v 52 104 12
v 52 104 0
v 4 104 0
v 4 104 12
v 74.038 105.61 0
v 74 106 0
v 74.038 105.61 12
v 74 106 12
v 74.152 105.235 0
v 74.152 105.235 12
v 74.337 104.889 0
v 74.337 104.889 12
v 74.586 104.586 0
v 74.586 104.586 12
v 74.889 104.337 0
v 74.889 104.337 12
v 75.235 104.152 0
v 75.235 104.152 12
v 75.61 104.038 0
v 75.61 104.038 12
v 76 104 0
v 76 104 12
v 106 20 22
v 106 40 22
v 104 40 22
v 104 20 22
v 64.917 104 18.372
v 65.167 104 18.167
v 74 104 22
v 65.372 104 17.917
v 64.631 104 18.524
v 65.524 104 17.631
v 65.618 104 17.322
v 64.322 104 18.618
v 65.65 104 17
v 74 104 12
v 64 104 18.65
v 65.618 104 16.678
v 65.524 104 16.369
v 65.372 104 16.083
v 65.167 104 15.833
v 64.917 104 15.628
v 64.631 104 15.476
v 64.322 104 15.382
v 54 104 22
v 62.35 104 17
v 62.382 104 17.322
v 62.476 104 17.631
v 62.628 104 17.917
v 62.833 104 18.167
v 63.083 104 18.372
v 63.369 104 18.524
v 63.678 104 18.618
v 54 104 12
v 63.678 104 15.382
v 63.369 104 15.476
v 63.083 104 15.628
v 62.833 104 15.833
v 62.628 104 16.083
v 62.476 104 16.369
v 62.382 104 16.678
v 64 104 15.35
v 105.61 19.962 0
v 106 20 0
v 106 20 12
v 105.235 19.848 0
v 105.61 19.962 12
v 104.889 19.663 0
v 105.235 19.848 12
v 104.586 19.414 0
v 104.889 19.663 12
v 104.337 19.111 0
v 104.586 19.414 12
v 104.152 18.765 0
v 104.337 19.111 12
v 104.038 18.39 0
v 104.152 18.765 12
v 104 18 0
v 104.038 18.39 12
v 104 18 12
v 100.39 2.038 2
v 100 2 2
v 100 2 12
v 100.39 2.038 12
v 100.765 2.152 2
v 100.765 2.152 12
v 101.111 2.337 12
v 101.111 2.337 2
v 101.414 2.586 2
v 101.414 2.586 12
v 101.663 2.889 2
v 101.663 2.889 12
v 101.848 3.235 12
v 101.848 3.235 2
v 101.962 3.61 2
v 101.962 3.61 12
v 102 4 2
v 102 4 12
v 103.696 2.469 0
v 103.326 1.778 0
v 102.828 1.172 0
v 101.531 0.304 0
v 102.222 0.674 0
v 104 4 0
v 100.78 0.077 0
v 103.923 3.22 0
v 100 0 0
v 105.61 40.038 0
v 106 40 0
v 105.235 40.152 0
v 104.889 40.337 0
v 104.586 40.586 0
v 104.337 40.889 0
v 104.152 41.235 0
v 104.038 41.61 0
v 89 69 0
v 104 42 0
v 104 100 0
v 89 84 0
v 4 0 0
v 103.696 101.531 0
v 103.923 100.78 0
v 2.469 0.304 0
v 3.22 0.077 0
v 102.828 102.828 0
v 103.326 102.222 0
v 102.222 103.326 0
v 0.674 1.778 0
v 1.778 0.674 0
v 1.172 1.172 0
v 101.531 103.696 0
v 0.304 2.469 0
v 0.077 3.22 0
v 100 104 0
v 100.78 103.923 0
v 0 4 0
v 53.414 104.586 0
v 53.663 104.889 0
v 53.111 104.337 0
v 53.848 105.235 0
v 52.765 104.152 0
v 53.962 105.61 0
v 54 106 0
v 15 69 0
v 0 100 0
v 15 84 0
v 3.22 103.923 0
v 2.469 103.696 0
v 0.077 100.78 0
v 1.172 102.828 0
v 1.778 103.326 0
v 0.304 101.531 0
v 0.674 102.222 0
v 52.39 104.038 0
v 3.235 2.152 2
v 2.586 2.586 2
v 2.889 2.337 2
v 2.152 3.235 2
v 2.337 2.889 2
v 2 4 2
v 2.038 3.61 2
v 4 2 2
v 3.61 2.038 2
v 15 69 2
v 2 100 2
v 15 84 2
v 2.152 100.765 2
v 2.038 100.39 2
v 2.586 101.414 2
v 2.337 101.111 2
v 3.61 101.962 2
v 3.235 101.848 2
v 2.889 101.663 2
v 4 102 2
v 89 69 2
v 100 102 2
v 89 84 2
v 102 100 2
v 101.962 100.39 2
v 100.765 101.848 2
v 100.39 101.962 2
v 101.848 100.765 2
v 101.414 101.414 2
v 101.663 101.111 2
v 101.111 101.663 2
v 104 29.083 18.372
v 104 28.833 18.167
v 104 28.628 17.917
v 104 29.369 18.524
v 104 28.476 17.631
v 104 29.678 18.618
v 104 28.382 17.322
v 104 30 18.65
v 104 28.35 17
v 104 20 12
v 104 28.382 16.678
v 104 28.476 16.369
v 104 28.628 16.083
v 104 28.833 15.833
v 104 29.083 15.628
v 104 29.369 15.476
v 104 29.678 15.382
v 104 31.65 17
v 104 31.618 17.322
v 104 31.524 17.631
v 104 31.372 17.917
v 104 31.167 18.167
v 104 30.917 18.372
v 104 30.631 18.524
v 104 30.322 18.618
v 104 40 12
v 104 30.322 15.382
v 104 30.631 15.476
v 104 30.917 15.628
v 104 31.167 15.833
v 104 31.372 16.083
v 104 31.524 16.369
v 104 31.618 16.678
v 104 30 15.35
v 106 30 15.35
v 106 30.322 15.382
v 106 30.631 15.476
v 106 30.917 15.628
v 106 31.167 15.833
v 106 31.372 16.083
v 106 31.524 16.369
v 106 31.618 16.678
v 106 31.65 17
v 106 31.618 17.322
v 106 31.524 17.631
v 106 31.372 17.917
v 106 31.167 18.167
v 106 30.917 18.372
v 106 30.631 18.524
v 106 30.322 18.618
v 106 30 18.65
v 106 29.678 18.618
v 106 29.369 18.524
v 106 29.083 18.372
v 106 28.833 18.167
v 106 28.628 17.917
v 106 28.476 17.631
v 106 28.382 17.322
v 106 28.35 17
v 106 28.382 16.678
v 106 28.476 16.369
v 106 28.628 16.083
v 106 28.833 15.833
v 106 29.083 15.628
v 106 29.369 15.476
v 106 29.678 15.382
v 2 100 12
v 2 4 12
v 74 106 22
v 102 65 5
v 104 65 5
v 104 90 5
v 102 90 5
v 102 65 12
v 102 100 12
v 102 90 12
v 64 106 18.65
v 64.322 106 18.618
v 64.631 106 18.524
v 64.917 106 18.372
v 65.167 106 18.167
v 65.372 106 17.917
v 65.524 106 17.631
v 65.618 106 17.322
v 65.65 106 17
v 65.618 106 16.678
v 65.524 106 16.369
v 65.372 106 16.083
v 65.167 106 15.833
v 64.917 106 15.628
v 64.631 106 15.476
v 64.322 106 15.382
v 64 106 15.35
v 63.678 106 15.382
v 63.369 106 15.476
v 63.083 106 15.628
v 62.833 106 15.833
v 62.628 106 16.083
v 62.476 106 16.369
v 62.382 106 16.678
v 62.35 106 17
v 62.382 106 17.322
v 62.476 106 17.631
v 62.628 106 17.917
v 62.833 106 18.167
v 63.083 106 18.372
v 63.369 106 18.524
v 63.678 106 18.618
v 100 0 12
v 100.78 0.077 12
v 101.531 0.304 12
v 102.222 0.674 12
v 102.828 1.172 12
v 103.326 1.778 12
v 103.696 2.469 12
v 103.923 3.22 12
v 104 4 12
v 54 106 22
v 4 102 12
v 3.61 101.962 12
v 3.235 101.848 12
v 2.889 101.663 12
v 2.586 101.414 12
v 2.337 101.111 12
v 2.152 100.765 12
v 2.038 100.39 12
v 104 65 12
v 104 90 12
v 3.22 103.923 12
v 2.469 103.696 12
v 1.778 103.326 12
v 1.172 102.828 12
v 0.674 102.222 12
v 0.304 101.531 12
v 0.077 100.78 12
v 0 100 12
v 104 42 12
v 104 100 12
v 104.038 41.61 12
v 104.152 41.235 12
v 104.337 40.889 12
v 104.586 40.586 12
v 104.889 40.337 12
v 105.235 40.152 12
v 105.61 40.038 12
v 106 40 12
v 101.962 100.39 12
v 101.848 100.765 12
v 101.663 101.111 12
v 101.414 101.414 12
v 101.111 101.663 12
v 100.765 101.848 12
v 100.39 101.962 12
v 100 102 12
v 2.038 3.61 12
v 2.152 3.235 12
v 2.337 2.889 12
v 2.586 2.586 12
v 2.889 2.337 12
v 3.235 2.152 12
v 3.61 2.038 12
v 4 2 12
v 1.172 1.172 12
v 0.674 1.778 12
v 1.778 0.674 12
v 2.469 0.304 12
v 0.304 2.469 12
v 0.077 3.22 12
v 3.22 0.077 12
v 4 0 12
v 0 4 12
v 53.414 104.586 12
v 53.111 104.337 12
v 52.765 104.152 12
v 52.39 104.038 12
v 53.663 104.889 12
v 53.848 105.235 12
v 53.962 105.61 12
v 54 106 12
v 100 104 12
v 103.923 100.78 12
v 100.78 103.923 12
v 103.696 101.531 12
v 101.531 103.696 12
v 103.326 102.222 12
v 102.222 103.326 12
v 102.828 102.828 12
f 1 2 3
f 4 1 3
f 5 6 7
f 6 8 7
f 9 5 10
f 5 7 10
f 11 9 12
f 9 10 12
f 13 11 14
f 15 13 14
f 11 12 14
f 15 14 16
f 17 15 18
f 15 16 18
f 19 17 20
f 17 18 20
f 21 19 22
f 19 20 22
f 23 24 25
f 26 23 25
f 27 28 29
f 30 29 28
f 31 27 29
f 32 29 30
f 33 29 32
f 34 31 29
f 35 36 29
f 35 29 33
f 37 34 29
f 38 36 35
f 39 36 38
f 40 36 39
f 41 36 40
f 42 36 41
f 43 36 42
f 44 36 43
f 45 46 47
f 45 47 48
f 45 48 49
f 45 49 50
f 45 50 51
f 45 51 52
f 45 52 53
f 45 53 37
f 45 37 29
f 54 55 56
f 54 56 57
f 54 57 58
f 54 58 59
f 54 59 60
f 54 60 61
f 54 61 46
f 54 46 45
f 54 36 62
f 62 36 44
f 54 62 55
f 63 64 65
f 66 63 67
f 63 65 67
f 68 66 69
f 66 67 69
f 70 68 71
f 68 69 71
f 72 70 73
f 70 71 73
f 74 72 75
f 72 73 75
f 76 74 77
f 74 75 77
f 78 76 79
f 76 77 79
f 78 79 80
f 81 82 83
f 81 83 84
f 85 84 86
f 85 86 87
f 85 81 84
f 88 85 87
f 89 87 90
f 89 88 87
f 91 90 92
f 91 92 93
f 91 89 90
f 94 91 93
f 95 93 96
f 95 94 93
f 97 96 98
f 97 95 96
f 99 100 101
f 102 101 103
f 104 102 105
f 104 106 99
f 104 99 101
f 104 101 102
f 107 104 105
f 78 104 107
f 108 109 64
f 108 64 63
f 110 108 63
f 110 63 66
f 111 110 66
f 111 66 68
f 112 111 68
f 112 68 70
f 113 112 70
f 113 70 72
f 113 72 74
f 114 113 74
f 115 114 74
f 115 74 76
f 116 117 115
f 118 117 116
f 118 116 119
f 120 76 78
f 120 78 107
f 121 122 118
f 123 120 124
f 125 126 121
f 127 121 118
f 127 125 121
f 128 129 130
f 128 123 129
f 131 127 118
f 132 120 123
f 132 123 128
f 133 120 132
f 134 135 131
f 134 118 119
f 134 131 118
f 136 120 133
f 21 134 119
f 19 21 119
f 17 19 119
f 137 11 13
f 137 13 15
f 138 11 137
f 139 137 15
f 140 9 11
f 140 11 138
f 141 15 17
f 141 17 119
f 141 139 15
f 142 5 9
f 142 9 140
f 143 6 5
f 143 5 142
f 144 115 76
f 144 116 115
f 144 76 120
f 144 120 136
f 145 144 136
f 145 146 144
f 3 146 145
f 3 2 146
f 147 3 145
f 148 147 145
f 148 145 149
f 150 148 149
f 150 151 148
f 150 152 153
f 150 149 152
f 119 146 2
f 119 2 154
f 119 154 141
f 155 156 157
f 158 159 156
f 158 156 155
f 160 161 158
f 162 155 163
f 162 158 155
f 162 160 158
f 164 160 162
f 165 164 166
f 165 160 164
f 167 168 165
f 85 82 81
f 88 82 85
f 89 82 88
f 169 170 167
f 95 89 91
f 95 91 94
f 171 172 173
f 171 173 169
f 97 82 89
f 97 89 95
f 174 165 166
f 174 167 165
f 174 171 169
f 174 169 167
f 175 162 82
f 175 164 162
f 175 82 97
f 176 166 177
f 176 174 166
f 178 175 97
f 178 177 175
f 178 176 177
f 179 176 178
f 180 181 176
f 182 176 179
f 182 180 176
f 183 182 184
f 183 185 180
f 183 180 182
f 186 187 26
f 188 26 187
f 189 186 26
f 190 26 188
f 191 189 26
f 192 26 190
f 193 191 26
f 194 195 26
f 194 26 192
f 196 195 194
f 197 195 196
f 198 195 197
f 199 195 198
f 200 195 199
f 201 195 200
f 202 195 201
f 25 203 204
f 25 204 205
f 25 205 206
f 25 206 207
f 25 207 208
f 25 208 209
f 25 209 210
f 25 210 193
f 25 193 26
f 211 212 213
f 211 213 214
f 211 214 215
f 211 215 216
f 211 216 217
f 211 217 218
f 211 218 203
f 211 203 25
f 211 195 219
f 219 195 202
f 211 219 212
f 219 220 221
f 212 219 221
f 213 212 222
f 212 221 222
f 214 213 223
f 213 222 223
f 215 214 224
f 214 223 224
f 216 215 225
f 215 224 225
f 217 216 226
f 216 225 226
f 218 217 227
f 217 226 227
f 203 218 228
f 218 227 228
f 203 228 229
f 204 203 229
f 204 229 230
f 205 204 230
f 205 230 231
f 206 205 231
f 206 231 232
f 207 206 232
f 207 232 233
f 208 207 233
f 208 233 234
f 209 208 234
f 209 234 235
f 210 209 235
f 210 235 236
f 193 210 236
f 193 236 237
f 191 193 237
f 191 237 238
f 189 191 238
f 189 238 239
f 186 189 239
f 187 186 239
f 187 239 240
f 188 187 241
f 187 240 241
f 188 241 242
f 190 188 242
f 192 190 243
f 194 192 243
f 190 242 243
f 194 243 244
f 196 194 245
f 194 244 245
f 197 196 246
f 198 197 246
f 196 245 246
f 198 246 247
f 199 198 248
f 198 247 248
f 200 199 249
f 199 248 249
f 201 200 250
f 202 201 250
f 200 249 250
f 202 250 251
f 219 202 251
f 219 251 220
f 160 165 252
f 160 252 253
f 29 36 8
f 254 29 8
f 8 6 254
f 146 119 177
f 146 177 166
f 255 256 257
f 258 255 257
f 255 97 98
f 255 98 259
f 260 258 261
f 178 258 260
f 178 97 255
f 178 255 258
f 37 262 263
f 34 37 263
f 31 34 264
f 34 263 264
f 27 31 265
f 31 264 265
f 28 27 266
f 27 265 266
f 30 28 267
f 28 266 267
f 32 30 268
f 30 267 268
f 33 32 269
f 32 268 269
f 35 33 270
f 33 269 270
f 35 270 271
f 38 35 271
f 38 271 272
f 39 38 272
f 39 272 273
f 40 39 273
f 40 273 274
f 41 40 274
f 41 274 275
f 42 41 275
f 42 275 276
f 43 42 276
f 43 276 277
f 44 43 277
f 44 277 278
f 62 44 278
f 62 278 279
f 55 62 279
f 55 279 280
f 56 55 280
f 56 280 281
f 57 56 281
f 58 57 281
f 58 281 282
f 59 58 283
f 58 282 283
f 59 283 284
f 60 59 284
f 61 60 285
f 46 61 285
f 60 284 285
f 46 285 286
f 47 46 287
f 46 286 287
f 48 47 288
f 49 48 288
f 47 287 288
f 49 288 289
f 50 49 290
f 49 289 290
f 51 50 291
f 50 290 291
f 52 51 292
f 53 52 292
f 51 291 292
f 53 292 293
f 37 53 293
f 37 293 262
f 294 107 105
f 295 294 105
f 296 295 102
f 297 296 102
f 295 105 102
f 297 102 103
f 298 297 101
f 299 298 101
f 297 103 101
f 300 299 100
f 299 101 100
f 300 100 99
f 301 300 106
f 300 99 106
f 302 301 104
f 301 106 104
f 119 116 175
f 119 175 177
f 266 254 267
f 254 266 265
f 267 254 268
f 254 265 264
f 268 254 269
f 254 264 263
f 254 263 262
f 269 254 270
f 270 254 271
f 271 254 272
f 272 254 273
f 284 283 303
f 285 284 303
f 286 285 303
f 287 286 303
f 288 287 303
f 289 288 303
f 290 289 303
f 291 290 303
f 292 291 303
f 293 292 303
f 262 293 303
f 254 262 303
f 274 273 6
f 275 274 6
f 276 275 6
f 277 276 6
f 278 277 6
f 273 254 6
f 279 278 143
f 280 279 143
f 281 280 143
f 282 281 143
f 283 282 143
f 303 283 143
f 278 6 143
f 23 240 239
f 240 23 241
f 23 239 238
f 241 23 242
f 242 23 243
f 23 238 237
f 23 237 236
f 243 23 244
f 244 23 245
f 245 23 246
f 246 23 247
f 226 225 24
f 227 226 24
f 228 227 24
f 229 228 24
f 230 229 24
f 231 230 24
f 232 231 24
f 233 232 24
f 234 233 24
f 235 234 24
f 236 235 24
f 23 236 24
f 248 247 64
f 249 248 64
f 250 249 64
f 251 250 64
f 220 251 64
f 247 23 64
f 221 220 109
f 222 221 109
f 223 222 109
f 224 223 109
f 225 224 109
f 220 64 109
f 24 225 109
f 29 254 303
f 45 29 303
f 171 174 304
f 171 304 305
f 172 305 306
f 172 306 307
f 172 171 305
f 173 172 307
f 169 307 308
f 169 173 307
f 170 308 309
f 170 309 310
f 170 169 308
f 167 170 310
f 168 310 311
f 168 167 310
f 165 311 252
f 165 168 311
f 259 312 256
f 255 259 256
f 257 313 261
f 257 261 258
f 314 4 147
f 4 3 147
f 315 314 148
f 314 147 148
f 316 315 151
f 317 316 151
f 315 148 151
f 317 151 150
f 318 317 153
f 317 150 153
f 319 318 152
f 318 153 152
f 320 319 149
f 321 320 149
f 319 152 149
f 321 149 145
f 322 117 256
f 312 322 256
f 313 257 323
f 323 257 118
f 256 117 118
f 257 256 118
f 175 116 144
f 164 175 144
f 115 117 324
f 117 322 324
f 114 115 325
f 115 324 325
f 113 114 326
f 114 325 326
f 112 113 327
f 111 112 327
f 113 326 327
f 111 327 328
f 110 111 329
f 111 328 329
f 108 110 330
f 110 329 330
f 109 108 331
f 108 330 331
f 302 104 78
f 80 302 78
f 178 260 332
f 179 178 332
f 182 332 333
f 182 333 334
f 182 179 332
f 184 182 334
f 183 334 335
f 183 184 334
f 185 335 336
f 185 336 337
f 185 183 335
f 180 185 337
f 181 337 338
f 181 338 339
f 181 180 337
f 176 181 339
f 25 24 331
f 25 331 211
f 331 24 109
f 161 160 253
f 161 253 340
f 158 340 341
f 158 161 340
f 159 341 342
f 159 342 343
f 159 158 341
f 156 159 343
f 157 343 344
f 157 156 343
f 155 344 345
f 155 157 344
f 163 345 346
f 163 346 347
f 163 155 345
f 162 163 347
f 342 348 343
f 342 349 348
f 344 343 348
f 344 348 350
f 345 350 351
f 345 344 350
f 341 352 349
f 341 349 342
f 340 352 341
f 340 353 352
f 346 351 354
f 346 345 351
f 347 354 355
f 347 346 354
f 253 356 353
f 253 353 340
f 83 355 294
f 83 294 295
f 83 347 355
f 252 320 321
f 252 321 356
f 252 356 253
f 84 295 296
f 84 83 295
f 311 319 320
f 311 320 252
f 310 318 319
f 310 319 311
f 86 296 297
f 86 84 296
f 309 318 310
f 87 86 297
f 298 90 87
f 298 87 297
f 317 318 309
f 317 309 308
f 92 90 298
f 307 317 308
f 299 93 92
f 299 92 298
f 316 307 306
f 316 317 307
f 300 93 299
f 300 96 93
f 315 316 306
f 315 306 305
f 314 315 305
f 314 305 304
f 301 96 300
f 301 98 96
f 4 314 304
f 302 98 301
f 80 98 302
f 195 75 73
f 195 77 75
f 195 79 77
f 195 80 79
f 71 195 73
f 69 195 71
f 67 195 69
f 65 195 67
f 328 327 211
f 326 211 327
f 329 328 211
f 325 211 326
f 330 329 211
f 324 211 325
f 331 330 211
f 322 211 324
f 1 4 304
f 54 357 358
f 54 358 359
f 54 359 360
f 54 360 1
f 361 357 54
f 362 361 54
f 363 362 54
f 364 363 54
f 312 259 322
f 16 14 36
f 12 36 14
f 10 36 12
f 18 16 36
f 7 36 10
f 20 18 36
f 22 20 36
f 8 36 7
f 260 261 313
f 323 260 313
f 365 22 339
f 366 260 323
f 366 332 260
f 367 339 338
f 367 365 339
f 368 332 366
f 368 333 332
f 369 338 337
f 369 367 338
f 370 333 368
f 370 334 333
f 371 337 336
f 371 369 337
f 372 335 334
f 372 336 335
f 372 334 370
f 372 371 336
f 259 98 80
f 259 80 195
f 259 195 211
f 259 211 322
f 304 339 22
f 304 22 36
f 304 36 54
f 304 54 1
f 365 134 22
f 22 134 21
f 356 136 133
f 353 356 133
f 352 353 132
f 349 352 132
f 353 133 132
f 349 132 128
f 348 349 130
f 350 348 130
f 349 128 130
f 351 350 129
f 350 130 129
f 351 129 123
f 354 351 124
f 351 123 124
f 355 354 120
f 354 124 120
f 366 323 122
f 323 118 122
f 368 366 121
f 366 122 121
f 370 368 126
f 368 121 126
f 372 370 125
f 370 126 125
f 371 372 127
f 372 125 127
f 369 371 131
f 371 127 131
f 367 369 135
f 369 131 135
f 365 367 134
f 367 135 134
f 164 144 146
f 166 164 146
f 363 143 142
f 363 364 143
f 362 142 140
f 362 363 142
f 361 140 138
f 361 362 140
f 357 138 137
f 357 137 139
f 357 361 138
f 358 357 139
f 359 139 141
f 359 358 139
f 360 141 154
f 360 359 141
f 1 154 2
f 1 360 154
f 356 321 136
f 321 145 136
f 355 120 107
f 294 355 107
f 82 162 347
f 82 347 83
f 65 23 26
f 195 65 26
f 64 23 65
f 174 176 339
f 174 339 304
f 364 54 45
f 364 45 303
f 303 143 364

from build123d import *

# Parameters (mm, degrees)
EXTRUDE_2_DEPTH     = 2
EXTRUDE_3_DEPTH     = 10
SKETCH_5_W          = 7
SKETCH_5_H          = 25
CUT_EXTRUDE_1_DEPTH = 10
SKETCH_6_W          = 74
SKETCH_6_H          = 15
CUT_EXTRUDE_2_DEPTH = 10
SKETCH_7_W          = 20
SKETCH_7_H          = 2
SKETCH_7_W_2        = 2
SKETCH_7_H_2        = 20
EXTRUDE_4_DEPTH     = 22
SKETCH_8_R          = 1.65
CUT_EXTRUDE_3_DEPTH = 22
SKETCH_10_R         = 1.65
CUT_EXTRUDE_4_DEPTH = 22
FILLET_1_R          = 2


with BuildPart() as part:
    # 草图1 → 凸台-拉伸2 (new body)
    with BuildSketch(Plane.XY):
        with BuildLine():
            Line((4, 0), (100, 0))
            ThreePointArc((100, 0), (102.828427125, 1.171572875), (104, 4))
            Line((104, 4), (104, 100))
            ThreePointArc((104, 100), (102.828427125, 102.828427125), (100, 104))
            Line((100, 104), (4, 104))
            ThreePointArc((4, 104), (1.171572875, 102.828427125), (0, 100))
            Line((0, 100), (0, 4))
            ThreePointArc((0, 4), (1.171572875, 1.171572875), (4, 0))
        make_face()
    extrude(amount=EXTRUDE_2_DEPTH)

    # 草图4 → 凸台-拉伸3 (add)
    with BuildSketch(Plane.XY.offset(2)):
        with BuildLine():
            Line((104, 4), (104, 100))
            ThreePointArc((104, 100), (102.828427125, 102.828427125), (100, 104))
            Line((100, 104), (4, 104))
            ThreePointArc((4, 104), (1.171572875, 102.828427125), (0, 100))
            Line((0, 100), (0, 4))
            ThreePointArc((0, 4), (1.171572875, 1.171572875), (4, 0))
            Line((4, 0), (100, 0))
            ThreePointArc((100, 0), (102.828427125, 1.171572875), (104, 4))
        make_face()
        with BuildLine():
            Line((102, 4), (102, 100))
            ThreePointArc((102, 100), (101.414213562, 101.414213562), (100, 102))
            Line((100, 102), (4, 102))
            ThreePointArc((4, 102), (2.585786438, 101.414213562), (2, 100))
            Line((2, 100), (2, 4))
            ThreePointArc((2, 4), (2.585786438, 2.585786438), (4, 2))
            Line((4, 2), (100, 2))
            ThreePointArc((100, 2), (101.414213562, 2.585786438), (102, 4))
        make_face(mode=Mode.SUBTRACT)
    extrude(amount=EXTRUDE_3_DEPTH)

    # 草图5 → 切除-拉伸1 (cut)
    with BuildSketch(Plane(origin=(104, 0, 0), x_dir=(0, 0, -1), z_dir=(1, 0, 0))):
        with Locations((-8.5, 77.5)):
            Rectangle(SKETCH_5_W, SKETCH_5_H)
    extrude(amount=-CUT_EXTRUDE_1_DEPTH, mode=Mode.SUBTRACT)

    # 草图6 → 切除-拉伸2 (cut)
    with BuildSketch(Plane(origin=(0, 0, 0), x_dir=(-1, 0, 0), z_dir=(0, 0, -1))):
        with Locations((-52, 76.5)):
            Rectangle(SKETCH_6_W, SKETCH_6_H)
    extrude(amount=-CUT_EXTRUDE_2_DEPTH, mode=Mode.SUBTRACT)

    # 草图7 → 凸台-拉伸4 (add)
    with BuildSketch(Plane(origin=(0, 0, 0), x_dir=(-1, 0, 0), z_dir=(0, 0, -1))):
        with Locations((-64, 105)):
            Rectangle(SKETCH_7_W, SKETCH_7_H)
        with Locations((-105, 30)):
            Rectangle(SKETCH_7_W_2, SKETCH_7_H_2)
    extrude(amount=-EXTRUDE_4_DEPTH)

    # 草图8 → 切除-拉伸3 (cut)
    with BuildSketch(Plane(origin=(106, 0, 0), x_dir=(0, 0, -1), z_dir=(1, 0, 0))):
        with Locations((-17, 30)):
            Circle(SKETCH_8_R)
    extrude(amount=-CUT_EXTRUDE_3_DEPTH, mode=Mode.SUBTRACT)

    # 草图10 → 切除-拉伸4 (cut)
    with BuildSketch(Plane(origin=(0, 106, 0), x_dir=(1, 0, 0), z_dir=(0, 1, 0))):
        with Locations(Location((64, -17, 0), (0, 0, 270))):
            Circle(SKETCH_10_R)
    extrude(amount=-CUT_EXTRUDE_4_DEPTH, mode=Mode.SUBTRACT)

    # 圆角1
    fillet_1_edges = [part.edges().sort_by_distance(p)[0] for p in [
        (54, 104, 6),
        (74, 104, 6),
        (104, 40, 6),
        (104, 20, 6),
    ]]
    fillet(fillet_1_edges, radius=FILLET_1_R - 0.0001)  # a hair under: the kernel refuses the full size


solid = part.part
